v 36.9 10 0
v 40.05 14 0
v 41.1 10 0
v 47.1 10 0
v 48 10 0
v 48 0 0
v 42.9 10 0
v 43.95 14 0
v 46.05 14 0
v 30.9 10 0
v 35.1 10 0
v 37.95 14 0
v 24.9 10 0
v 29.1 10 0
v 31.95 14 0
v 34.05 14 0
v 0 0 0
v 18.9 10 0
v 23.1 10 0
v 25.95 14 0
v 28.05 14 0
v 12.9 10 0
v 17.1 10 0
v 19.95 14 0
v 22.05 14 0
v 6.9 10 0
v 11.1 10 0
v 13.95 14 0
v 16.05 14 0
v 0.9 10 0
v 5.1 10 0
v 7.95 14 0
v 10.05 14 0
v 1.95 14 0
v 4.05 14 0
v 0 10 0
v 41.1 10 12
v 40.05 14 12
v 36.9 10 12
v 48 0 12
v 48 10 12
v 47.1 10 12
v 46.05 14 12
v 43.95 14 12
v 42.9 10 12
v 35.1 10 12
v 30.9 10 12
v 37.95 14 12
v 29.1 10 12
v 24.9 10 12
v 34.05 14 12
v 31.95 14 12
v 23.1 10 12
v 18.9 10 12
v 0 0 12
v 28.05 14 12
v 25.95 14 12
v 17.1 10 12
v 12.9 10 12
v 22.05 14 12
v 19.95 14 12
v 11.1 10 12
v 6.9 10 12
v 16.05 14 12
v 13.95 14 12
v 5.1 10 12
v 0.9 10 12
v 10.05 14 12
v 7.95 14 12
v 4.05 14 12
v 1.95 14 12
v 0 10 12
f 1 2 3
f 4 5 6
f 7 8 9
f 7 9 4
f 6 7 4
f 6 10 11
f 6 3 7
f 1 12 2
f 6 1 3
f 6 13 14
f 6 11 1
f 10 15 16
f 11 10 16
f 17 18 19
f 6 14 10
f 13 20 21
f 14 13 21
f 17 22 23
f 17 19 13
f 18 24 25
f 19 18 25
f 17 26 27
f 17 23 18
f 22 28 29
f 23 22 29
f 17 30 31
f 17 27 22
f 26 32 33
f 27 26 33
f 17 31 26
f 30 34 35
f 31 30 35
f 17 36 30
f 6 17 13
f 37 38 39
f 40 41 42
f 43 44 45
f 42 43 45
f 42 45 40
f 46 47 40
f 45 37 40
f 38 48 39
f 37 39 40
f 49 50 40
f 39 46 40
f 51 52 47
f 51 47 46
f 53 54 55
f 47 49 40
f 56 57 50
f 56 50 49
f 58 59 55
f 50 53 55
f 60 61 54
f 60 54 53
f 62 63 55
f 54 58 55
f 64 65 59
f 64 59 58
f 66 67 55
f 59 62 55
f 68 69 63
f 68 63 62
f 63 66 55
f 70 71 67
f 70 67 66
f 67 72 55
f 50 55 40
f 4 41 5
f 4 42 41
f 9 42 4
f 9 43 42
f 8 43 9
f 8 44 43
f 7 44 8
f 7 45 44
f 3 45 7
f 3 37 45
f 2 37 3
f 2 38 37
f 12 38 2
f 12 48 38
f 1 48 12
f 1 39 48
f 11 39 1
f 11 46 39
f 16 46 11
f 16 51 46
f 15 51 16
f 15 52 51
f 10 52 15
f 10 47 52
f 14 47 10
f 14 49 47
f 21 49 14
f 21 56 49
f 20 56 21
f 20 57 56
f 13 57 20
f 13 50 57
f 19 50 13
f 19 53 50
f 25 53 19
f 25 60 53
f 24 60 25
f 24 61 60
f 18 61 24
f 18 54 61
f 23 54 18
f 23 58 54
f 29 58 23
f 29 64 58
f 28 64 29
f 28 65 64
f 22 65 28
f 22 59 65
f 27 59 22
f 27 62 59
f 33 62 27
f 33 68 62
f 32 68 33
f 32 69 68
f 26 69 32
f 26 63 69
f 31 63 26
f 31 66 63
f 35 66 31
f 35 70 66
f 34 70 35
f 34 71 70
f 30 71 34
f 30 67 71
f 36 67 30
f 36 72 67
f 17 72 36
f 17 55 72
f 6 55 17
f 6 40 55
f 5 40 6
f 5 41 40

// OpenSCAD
$fn = 32;

// ----------------------------------------------------------------------
// Gear rack: 8 teeth, pitch 6 mm
// ----------------------------------------------------------------------

// --- parameters (mm) ---
teeth = 8;                // number of teeth
pitch = 6;                // tooth pitch, X
root_w = 4.2;             // tooth width at the root
tip_w = 2.1;              // tooth width at the tip
base_h = 10;              // rack body height, Y
tooth_h = 4;              // tooth height above the body
plate_t = 12;             // rack width, Z (extrusion height)

rack_l = teeth * pitch;  // overall length
total_h = base_h + tooth_h;  // overall height

profile = [[0, 0], [48, 0], [48, 10], [47.1, 10], [46.05, 14], [43.95, 14], [42.9, 10], [41.1, 10], [40.05, 14], [37.95, 14], [36.9, 10], [35.1, 10], [34.05, 14], [31.95, 14], [30.9, 10], [29.1, 10], [28.05, 14], [25.95, 14], [24.9, 10], [23.1, 10], [22.05, 14], [19.95, 14], [18.9, 10], [17.1, 10], [16.05, 14], [13.95, 14], [12.9, 10], [11.1, 10], [10.05, 14], [7.95, 14], [6.9, 10], [5.1, 10], [4.05, 14], [1.95, 14], [0.9, 10], [0, 10]];  // primary outline, 36 points, counter clockwise

// --- the one profile operation ---
linear_extrude(height = plate_t) polygon(points = profile);
